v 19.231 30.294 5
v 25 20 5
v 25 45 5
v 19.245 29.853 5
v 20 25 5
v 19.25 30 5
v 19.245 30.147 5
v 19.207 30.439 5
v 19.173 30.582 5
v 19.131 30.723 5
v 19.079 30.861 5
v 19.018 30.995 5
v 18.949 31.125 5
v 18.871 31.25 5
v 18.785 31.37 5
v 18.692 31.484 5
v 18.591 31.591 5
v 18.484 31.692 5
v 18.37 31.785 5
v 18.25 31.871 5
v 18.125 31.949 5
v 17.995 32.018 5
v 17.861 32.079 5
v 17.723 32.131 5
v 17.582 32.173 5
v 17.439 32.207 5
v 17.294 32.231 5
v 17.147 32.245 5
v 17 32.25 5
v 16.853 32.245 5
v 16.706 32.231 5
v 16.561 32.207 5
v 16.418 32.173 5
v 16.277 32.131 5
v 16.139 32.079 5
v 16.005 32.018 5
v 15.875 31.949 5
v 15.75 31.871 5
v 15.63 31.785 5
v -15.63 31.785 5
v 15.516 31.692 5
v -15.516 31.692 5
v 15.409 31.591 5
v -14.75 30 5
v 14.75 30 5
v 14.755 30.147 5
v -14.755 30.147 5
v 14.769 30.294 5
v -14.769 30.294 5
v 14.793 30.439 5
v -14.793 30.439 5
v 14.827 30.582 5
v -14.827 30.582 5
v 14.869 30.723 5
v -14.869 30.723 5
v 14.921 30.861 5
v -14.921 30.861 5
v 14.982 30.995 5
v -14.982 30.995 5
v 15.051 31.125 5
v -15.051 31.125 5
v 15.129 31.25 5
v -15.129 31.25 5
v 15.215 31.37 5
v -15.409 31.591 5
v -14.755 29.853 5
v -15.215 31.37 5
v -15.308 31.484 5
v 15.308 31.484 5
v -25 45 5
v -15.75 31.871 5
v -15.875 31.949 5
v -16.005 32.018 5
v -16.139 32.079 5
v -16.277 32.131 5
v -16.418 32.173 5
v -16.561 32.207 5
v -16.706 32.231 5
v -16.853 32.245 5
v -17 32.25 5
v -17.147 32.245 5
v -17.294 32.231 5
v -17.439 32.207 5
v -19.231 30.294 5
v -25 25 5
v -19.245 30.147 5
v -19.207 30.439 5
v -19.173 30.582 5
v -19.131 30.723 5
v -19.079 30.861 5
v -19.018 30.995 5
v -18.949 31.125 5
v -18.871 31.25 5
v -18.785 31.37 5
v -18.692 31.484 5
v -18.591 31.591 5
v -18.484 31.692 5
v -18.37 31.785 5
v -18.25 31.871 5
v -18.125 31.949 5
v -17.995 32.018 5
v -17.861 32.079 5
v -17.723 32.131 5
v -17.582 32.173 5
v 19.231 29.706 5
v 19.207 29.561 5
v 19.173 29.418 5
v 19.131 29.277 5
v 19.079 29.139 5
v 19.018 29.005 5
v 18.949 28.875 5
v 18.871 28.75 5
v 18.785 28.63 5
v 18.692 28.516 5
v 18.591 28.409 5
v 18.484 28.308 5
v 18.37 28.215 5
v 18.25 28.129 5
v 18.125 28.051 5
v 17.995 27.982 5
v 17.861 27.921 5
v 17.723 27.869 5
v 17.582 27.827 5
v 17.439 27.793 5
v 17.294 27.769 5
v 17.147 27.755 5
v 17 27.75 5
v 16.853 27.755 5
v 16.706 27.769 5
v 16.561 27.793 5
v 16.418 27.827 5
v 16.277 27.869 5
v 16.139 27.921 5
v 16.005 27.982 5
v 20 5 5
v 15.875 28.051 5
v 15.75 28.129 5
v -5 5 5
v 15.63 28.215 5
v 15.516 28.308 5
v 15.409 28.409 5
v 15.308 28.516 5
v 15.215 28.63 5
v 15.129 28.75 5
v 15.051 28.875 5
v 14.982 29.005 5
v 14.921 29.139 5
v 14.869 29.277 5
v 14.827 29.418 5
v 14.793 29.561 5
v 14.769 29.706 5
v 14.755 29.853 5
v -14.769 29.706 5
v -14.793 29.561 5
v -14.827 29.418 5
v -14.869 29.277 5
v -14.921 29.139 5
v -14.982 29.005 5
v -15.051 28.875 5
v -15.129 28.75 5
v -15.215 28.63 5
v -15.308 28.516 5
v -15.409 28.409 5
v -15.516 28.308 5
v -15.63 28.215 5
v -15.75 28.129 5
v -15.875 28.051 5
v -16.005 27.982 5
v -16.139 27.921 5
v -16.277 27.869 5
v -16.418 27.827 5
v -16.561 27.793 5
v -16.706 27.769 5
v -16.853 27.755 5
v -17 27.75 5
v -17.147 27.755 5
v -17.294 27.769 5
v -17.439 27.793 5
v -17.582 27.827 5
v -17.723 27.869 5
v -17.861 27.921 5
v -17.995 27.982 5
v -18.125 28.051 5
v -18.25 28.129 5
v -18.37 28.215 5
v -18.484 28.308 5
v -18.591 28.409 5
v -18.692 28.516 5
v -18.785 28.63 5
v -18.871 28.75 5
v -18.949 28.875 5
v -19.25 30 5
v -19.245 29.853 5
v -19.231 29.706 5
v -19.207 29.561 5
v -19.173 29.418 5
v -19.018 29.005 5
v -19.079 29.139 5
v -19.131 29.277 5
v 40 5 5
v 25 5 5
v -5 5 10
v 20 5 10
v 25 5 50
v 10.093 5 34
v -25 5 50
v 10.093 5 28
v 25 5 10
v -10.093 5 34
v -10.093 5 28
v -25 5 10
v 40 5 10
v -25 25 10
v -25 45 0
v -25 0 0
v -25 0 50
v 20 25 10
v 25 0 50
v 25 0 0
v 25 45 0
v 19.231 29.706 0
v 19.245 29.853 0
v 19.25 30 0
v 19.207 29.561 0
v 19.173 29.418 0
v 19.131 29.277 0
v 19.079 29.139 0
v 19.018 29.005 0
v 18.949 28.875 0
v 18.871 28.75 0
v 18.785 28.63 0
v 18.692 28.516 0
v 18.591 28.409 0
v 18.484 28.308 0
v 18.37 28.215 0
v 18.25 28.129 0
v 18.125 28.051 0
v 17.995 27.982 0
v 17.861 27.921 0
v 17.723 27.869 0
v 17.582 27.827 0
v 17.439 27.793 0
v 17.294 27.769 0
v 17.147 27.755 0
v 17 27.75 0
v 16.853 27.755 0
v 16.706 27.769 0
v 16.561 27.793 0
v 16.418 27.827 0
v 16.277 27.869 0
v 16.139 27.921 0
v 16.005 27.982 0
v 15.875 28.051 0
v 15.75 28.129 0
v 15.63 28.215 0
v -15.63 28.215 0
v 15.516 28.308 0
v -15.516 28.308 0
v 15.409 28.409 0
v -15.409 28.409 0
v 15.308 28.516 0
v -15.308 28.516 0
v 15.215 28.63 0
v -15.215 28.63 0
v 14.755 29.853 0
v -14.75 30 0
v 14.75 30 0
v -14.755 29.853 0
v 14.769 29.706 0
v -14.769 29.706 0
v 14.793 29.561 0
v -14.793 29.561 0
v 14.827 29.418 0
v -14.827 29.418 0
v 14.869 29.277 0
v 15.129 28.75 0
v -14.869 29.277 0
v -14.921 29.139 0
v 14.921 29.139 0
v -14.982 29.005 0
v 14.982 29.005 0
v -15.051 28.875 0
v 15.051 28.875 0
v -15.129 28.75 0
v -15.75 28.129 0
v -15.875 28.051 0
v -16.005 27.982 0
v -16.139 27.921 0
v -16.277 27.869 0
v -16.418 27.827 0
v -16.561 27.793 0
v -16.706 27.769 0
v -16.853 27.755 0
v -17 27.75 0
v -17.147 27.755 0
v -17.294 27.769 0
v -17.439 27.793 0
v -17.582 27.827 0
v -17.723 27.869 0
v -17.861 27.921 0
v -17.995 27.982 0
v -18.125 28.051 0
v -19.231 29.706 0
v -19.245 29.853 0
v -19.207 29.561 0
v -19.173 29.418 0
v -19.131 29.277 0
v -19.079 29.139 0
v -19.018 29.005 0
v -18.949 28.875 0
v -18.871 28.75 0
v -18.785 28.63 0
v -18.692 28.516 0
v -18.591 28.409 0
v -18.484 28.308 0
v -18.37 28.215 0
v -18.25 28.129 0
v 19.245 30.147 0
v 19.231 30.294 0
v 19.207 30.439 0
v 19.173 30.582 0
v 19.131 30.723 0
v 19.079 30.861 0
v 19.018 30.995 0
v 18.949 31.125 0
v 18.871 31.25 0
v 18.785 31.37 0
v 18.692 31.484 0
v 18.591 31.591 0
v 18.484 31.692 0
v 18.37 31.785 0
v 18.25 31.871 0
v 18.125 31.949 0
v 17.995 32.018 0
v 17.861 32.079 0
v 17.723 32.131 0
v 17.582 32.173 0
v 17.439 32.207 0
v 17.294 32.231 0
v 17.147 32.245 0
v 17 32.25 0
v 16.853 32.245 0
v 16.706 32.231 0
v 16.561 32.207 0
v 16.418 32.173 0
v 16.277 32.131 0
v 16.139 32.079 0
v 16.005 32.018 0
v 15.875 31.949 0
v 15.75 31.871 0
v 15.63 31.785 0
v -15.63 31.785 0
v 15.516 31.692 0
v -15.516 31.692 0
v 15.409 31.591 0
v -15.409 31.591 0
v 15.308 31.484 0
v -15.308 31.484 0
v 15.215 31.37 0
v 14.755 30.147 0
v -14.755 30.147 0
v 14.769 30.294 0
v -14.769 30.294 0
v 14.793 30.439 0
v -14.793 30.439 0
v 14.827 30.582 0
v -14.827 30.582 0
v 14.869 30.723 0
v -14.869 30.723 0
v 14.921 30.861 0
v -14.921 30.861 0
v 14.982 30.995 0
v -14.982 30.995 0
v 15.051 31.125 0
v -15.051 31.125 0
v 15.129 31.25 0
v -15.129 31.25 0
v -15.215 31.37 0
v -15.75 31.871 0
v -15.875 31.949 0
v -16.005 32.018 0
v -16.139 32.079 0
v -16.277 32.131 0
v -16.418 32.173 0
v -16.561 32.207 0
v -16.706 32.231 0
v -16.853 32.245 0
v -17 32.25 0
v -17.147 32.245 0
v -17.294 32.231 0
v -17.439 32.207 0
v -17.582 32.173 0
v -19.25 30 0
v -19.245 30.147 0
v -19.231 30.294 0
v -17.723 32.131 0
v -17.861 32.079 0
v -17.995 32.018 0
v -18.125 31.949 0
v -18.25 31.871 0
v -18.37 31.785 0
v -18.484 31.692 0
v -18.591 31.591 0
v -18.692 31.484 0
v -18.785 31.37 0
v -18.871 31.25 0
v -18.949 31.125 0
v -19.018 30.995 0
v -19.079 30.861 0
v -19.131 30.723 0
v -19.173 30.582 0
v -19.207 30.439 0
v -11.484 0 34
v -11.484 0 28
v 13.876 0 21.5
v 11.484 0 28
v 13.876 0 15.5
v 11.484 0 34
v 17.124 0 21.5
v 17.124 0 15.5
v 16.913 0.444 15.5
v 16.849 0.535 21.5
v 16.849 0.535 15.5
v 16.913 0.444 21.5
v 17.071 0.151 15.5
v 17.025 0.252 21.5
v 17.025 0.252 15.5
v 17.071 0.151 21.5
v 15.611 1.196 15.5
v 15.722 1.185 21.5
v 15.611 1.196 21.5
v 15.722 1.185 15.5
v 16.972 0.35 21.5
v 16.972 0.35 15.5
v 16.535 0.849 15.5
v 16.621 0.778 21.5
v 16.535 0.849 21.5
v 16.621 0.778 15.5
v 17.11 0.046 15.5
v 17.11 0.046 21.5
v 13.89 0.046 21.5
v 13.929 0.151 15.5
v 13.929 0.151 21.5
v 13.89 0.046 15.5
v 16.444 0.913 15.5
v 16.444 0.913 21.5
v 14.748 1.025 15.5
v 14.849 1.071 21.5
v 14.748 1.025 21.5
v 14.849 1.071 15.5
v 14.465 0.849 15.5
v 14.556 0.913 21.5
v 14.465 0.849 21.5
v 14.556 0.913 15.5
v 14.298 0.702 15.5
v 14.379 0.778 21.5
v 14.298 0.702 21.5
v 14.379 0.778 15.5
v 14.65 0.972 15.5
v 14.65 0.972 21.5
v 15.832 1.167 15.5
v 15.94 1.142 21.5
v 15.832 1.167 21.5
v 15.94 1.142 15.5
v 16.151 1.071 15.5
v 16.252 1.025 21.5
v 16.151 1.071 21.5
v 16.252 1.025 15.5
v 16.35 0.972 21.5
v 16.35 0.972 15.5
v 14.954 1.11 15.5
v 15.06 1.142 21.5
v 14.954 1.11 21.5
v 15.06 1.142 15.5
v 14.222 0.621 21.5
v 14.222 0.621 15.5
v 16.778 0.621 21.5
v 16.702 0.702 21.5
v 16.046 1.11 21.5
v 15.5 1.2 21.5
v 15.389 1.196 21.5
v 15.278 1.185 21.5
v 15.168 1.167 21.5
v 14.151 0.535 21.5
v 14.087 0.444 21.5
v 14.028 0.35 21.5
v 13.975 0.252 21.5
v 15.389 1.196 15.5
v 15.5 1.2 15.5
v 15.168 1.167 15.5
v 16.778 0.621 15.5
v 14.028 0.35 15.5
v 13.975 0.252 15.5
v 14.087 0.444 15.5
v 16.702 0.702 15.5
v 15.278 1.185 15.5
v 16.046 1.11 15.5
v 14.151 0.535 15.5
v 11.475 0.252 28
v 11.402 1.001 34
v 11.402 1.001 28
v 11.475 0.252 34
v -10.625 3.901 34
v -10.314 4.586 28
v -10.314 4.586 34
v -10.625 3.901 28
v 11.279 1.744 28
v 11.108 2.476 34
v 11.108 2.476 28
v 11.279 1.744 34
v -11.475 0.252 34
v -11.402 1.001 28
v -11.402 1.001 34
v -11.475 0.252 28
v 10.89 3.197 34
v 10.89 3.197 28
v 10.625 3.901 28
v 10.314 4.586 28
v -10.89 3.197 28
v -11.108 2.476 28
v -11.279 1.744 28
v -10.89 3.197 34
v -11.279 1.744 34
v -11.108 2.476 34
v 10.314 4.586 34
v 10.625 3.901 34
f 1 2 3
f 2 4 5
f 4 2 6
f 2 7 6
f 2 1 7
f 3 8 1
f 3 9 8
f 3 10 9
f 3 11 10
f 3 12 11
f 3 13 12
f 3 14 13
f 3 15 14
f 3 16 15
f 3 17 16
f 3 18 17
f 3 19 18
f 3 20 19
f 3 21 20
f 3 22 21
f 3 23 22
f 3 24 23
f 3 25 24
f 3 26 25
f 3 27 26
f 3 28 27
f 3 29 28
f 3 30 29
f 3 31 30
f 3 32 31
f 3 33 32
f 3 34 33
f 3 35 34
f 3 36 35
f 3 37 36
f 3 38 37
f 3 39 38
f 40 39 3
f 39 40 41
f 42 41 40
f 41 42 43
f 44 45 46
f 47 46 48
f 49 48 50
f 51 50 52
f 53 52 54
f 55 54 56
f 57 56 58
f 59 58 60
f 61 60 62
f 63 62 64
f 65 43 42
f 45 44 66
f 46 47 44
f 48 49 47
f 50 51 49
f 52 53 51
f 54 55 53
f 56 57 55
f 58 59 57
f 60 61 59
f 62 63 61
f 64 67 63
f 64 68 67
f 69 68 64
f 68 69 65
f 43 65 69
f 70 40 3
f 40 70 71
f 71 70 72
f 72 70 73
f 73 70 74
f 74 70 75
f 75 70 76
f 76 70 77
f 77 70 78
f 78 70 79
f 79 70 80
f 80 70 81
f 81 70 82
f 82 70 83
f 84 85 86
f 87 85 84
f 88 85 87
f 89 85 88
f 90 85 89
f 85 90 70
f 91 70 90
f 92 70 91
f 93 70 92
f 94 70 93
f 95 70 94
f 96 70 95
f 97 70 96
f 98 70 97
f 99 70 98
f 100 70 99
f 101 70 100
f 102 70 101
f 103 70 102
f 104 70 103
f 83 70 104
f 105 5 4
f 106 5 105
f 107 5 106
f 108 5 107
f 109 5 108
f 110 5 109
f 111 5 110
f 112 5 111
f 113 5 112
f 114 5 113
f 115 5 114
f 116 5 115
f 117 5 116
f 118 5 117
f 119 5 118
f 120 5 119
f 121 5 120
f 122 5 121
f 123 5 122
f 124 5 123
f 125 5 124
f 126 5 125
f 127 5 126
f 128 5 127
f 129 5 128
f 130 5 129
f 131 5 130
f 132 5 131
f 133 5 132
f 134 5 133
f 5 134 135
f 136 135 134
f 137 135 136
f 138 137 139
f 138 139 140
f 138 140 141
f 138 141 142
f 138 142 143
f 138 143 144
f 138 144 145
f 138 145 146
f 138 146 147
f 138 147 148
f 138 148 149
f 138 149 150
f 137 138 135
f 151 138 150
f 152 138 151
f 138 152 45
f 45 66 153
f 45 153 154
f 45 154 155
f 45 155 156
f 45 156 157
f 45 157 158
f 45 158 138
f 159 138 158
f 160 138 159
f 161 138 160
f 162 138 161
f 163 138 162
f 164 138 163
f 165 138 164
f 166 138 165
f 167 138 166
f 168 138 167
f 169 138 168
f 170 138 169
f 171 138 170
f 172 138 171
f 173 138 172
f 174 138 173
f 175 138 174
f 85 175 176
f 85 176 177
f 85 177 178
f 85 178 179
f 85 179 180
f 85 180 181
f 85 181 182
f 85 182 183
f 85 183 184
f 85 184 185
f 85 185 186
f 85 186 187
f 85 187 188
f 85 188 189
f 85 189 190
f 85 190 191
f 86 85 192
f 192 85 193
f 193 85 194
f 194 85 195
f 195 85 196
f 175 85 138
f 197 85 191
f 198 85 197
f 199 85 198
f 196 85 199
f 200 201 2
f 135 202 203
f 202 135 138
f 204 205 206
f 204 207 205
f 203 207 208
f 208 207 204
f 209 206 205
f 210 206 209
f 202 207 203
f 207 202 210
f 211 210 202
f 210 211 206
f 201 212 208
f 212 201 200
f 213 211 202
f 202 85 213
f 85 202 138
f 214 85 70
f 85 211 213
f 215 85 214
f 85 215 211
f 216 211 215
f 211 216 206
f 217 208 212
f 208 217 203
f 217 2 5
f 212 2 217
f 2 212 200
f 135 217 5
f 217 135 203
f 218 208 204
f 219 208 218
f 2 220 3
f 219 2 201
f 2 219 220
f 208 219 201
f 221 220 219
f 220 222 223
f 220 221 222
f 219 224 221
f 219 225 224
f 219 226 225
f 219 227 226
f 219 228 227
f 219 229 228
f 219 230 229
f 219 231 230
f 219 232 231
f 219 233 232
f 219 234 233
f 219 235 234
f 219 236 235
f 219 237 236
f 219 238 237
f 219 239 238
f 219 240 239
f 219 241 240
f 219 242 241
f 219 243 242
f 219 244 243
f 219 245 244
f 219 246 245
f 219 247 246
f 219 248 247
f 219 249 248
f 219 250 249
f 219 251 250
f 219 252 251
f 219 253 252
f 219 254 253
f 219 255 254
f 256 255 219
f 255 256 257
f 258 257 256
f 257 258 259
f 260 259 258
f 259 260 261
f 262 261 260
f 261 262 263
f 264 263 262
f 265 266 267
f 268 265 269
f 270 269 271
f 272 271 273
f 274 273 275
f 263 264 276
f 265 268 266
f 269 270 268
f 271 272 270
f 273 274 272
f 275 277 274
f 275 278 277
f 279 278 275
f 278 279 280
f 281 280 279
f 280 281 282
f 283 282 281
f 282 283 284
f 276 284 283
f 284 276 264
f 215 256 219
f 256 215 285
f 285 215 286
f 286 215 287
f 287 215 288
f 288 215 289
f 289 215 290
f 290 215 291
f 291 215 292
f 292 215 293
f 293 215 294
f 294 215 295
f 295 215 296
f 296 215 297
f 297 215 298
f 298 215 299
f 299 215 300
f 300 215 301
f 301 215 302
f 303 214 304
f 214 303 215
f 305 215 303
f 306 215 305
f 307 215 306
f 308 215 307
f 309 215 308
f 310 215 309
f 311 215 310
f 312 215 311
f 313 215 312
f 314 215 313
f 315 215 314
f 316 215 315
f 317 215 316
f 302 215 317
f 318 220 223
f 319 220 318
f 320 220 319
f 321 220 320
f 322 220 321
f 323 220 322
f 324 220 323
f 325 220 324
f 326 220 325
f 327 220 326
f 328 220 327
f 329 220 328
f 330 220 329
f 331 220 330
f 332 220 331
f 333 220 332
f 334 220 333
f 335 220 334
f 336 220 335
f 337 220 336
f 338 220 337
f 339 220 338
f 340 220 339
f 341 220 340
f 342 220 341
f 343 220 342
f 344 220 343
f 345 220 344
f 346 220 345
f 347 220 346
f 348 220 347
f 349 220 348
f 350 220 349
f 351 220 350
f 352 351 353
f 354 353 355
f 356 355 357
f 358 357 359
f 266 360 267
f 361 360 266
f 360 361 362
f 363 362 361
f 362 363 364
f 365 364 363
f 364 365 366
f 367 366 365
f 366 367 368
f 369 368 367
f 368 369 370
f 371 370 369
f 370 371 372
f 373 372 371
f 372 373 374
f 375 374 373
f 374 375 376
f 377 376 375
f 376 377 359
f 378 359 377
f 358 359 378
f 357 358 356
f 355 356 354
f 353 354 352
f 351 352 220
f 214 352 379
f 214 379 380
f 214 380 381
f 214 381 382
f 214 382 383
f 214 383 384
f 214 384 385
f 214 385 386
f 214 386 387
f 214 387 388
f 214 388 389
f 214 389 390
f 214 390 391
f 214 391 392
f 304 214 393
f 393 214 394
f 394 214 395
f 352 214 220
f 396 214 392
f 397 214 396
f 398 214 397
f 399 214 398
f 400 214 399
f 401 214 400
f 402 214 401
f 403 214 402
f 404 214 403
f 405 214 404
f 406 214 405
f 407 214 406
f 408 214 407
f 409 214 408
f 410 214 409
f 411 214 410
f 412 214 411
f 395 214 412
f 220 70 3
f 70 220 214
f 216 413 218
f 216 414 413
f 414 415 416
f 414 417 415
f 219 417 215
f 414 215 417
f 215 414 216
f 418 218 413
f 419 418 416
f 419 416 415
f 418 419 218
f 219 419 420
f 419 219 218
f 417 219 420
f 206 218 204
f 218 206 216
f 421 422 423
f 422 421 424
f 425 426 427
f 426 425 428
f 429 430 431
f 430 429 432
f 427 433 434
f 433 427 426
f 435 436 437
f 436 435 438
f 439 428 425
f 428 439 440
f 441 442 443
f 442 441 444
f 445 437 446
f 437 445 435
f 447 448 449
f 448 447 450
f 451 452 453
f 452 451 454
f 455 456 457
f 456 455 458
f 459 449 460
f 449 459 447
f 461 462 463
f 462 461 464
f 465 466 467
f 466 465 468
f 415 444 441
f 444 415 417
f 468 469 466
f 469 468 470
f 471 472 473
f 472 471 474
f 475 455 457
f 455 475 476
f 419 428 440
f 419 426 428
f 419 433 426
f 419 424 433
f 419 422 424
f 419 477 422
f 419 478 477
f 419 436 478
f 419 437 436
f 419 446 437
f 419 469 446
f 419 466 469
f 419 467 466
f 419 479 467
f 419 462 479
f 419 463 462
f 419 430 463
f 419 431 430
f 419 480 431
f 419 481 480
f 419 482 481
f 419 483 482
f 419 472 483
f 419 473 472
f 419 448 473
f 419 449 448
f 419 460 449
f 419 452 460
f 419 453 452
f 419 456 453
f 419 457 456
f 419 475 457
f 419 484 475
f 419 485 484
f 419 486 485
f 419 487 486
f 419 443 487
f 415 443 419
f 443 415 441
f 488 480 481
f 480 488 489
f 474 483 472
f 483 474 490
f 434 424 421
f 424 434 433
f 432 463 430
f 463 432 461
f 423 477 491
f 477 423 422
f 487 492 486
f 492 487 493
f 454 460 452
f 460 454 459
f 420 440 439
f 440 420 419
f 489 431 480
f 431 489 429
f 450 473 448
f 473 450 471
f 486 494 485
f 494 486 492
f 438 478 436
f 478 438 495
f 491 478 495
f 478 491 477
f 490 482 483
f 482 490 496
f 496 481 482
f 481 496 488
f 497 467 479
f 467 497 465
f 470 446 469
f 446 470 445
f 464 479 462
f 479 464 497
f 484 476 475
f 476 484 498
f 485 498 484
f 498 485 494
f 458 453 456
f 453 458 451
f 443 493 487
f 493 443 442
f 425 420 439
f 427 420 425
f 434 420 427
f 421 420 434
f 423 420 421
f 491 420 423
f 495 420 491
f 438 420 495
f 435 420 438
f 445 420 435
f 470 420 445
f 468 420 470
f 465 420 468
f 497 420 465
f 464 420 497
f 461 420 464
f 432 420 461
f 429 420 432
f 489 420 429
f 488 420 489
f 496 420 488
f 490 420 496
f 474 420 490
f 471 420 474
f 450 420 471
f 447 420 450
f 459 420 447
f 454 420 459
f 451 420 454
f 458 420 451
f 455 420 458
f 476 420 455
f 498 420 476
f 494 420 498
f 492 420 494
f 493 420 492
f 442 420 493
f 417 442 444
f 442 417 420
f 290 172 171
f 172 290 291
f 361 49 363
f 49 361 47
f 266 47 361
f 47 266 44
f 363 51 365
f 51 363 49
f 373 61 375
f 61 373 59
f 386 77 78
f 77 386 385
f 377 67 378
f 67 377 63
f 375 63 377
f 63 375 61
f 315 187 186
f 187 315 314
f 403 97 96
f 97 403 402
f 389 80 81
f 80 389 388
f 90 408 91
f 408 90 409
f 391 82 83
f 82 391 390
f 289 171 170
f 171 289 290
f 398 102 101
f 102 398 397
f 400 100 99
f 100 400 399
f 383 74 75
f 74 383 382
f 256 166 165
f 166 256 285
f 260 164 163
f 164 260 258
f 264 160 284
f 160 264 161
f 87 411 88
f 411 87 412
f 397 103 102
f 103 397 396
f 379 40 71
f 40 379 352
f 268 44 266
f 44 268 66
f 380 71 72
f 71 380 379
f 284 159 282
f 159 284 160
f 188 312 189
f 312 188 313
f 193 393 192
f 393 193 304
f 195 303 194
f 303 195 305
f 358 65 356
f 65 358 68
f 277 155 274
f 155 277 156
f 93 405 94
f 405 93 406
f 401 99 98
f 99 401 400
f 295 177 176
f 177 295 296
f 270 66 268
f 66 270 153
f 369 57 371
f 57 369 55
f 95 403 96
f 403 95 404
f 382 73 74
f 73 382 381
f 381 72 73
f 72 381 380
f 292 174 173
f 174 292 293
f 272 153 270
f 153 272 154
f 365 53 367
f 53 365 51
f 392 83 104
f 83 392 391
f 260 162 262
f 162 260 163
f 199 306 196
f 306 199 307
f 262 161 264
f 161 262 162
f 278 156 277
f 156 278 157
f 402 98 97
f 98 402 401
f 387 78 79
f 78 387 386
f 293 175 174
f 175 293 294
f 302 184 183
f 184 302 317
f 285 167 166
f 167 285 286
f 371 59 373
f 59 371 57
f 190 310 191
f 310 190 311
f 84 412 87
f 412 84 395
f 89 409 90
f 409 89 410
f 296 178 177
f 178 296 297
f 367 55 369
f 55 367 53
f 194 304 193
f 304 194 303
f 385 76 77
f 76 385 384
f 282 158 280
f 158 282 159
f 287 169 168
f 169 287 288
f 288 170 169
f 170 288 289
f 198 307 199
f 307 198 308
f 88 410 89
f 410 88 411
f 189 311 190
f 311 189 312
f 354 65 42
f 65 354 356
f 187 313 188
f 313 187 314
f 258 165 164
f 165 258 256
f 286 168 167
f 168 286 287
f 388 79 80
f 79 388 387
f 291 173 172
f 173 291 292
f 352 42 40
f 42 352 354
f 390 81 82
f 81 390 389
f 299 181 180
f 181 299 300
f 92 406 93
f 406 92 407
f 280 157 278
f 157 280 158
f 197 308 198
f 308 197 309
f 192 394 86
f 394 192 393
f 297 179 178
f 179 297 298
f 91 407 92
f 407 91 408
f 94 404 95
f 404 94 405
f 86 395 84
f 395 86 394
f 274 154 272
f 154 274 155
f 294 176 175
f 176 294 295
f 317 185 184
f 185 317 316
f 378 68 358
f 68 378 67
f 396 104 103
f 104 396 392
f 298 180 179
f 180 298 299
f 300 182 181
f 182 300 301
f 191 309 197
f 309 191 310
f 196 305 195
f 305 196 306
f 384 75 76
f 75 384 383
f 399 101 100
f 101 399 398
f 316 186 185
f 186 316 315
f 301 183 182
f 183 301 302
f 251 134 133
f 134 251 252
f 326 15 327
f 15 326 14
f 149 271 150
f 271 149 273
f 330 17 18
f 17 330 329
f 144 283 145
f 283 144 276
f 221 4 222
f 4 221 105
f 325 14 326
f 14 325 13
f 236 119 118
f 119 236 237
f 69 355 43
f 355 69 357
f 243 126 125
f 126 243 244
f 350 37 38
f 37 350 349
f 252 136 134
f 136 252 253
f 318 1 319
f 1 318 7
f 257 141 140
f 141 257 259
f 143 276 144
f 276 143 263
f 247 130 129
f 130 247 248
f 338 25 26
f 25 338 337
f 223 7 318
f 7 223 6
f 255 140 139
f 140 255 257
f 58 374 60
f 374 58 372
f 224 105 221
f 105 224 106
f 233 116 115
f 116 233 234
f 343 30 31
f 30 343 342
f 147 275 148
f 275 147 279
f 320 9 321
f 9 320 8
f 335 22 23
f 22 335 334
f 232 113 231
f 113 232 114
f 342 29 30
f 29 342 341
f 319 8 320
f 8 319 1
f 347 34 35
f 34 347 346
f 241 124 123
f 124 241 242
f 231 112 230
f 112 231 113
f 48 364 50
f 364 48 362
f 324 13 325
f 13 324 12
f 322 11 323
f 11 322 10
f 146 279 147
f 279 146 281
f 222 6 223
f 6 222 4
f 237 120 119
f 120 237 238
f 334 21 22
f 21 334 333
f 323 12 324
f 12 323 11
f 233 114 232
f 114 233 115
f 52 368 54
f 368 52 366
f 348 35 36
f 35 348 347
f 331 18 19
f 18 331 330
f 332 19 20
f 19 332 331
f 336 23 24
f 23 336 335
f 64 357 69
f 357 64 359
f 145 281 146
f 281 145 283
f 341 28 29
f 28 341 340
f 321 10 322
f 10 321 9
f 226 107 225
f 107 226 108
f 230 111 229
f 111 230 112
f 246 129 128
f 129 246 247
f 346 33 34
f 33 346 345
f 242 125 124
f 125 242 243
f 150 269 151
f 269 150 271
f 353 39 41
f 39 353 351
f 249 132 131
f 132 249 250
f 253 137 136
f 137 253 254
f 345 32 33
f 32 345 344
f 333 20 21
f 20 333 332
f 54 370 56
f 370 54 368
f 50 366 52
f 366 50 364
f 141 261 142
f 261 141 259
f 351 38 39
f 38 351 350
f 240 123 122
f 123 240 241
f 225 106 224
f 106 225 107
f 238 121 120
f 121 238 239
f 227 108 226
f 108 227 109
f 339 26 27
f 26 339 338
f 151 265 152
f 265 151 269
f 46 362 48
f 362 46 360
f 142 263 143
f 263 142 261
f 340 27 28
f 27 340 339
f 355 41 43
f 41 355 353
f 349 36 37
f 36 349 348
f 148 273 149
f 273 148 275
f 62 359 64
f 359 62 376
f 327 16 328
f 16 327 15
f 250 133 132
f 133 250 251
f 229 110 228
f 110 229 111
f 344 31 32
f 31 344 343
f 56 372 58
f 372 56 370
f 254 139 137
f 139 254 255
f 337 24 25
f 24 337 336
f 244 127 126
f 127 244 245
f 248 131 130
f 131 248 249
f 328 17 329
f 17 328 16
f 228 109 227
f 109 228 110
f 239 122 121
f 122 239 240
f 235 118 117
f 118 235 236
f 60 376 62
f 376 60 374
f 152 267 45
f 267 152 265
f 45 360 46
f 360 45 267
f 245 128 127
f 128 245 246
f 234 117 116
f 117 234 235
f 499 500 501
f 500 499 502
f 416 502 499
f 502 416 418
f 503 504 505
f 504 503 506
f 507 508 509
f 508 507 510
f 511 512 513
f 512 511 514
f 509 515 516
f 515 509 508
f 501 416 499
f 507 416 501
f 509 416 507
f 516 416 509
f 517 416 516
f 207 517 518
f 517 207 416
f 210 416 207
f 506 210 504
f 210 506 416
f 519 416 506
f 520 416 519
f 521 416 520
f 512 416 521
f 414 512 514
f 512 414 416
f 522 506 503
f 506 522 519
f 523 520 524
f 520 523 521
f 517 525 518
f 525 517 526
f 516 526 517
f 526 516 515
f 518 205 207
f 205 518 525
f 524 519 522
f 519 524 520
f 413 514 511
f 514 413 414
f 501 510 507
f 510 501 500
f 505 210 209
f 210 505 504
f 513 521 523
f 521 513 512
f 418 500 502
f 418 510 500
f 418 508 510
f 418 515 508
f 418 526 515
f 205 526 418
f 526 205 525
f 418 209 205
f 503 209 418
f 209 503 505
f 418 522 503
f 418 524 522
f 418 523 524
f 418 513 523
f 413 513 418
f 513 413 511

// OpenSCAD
// L-shaped mounting bracket for NEMA 17 stepper motor (e.g. syringe pump)
// Print orientation: base plate on bed, vertical plate builds upward (+Z)

// ---------------- Parameters ----------------
base_x0      = -25;   // base plate x start
base_x1      = 25;    // base plate x end
base_y0      = 0;     // base plate y start
base_y1      = 45;    // base plate y end
base_z       = 5;     // base plate thickness

motor_x0     = -25;   // motor plate x start
motor_x1     = 25;    // motor plate x end
motor_y      = 5;     // motor plate y end (thickness)
motor_z      = 50;    // motor plate height

boss_hole    = 23;    // motor centring boss hole diameter
boss_x       = 0;     // boss hole x centre
boss_z       = 28;    // boss hole z centre

screw_hole   = 3.4;   // M3 screw hole diameter
screw_n      = 4;     // number of screw holes
screw_pitch  = 31;    // square pattern side length

gusset_t     = 5;     // gusset thickness (x direction)
gusset_x0    = -25;   // left gusset x start
gusset_x1    = -20;   // left gusset x end
gusset_y     = 20;    // gusset leg along +Y
gusset_z     = 20;    // gusset leg along +Z

eps          = 0.5;   // cutter overshoot past faces

$fn = 96;

// ---------------- Model ----------------
difference() {
    union() {
        // Base plate
        translate([base_x0, base_y0, 0])
            cube([base_x1 - base_x0, base_y1 - base_y0, base_z]);

        // Vertical motor plate
        translate([motor_x0, 0, 0])
            cube([motor_x1 - motor_x0, motor_y, motor_z]);

        // Gussets (right-angle corner at y = 5, z = 5)
        for (sx = [-1, 1])
            translate([sx > 0 ? 20 : gusset_x0, 5, 5])
                linear_extrude(height = gusset_t)
                    polygon([[0, 0], [gusset_y, 0], [0, gusset_z]]);
    }

    // Base plate through-holes (M4)
    translate([-17, 30, -eps])
        cylinder(d = 4.5, h = base_z + 2 * eps);
    translate([17, 30, -eps])
        cylinder(d = 4.5, h = base_z + 2 * eps);

    // Motor plate boss hole (along Y)
    translate([boss_x, -eps, boss_z])
        cylinder(d = boss_hole, h = motor_y + 2 * eps);

    // Motor plate screw holes (M3, square pattern)
    for (i = [0 : screw_n - 1]) {
        x = -screw_pitch / 2 + i * screw_pitch;
        y = -screw_pitch / 2 + i * screw_pitch;
        translate([x, -eps, y])
            cylinder(d = screw_hole, h = motor_y + 2 * eps);
    }
}
